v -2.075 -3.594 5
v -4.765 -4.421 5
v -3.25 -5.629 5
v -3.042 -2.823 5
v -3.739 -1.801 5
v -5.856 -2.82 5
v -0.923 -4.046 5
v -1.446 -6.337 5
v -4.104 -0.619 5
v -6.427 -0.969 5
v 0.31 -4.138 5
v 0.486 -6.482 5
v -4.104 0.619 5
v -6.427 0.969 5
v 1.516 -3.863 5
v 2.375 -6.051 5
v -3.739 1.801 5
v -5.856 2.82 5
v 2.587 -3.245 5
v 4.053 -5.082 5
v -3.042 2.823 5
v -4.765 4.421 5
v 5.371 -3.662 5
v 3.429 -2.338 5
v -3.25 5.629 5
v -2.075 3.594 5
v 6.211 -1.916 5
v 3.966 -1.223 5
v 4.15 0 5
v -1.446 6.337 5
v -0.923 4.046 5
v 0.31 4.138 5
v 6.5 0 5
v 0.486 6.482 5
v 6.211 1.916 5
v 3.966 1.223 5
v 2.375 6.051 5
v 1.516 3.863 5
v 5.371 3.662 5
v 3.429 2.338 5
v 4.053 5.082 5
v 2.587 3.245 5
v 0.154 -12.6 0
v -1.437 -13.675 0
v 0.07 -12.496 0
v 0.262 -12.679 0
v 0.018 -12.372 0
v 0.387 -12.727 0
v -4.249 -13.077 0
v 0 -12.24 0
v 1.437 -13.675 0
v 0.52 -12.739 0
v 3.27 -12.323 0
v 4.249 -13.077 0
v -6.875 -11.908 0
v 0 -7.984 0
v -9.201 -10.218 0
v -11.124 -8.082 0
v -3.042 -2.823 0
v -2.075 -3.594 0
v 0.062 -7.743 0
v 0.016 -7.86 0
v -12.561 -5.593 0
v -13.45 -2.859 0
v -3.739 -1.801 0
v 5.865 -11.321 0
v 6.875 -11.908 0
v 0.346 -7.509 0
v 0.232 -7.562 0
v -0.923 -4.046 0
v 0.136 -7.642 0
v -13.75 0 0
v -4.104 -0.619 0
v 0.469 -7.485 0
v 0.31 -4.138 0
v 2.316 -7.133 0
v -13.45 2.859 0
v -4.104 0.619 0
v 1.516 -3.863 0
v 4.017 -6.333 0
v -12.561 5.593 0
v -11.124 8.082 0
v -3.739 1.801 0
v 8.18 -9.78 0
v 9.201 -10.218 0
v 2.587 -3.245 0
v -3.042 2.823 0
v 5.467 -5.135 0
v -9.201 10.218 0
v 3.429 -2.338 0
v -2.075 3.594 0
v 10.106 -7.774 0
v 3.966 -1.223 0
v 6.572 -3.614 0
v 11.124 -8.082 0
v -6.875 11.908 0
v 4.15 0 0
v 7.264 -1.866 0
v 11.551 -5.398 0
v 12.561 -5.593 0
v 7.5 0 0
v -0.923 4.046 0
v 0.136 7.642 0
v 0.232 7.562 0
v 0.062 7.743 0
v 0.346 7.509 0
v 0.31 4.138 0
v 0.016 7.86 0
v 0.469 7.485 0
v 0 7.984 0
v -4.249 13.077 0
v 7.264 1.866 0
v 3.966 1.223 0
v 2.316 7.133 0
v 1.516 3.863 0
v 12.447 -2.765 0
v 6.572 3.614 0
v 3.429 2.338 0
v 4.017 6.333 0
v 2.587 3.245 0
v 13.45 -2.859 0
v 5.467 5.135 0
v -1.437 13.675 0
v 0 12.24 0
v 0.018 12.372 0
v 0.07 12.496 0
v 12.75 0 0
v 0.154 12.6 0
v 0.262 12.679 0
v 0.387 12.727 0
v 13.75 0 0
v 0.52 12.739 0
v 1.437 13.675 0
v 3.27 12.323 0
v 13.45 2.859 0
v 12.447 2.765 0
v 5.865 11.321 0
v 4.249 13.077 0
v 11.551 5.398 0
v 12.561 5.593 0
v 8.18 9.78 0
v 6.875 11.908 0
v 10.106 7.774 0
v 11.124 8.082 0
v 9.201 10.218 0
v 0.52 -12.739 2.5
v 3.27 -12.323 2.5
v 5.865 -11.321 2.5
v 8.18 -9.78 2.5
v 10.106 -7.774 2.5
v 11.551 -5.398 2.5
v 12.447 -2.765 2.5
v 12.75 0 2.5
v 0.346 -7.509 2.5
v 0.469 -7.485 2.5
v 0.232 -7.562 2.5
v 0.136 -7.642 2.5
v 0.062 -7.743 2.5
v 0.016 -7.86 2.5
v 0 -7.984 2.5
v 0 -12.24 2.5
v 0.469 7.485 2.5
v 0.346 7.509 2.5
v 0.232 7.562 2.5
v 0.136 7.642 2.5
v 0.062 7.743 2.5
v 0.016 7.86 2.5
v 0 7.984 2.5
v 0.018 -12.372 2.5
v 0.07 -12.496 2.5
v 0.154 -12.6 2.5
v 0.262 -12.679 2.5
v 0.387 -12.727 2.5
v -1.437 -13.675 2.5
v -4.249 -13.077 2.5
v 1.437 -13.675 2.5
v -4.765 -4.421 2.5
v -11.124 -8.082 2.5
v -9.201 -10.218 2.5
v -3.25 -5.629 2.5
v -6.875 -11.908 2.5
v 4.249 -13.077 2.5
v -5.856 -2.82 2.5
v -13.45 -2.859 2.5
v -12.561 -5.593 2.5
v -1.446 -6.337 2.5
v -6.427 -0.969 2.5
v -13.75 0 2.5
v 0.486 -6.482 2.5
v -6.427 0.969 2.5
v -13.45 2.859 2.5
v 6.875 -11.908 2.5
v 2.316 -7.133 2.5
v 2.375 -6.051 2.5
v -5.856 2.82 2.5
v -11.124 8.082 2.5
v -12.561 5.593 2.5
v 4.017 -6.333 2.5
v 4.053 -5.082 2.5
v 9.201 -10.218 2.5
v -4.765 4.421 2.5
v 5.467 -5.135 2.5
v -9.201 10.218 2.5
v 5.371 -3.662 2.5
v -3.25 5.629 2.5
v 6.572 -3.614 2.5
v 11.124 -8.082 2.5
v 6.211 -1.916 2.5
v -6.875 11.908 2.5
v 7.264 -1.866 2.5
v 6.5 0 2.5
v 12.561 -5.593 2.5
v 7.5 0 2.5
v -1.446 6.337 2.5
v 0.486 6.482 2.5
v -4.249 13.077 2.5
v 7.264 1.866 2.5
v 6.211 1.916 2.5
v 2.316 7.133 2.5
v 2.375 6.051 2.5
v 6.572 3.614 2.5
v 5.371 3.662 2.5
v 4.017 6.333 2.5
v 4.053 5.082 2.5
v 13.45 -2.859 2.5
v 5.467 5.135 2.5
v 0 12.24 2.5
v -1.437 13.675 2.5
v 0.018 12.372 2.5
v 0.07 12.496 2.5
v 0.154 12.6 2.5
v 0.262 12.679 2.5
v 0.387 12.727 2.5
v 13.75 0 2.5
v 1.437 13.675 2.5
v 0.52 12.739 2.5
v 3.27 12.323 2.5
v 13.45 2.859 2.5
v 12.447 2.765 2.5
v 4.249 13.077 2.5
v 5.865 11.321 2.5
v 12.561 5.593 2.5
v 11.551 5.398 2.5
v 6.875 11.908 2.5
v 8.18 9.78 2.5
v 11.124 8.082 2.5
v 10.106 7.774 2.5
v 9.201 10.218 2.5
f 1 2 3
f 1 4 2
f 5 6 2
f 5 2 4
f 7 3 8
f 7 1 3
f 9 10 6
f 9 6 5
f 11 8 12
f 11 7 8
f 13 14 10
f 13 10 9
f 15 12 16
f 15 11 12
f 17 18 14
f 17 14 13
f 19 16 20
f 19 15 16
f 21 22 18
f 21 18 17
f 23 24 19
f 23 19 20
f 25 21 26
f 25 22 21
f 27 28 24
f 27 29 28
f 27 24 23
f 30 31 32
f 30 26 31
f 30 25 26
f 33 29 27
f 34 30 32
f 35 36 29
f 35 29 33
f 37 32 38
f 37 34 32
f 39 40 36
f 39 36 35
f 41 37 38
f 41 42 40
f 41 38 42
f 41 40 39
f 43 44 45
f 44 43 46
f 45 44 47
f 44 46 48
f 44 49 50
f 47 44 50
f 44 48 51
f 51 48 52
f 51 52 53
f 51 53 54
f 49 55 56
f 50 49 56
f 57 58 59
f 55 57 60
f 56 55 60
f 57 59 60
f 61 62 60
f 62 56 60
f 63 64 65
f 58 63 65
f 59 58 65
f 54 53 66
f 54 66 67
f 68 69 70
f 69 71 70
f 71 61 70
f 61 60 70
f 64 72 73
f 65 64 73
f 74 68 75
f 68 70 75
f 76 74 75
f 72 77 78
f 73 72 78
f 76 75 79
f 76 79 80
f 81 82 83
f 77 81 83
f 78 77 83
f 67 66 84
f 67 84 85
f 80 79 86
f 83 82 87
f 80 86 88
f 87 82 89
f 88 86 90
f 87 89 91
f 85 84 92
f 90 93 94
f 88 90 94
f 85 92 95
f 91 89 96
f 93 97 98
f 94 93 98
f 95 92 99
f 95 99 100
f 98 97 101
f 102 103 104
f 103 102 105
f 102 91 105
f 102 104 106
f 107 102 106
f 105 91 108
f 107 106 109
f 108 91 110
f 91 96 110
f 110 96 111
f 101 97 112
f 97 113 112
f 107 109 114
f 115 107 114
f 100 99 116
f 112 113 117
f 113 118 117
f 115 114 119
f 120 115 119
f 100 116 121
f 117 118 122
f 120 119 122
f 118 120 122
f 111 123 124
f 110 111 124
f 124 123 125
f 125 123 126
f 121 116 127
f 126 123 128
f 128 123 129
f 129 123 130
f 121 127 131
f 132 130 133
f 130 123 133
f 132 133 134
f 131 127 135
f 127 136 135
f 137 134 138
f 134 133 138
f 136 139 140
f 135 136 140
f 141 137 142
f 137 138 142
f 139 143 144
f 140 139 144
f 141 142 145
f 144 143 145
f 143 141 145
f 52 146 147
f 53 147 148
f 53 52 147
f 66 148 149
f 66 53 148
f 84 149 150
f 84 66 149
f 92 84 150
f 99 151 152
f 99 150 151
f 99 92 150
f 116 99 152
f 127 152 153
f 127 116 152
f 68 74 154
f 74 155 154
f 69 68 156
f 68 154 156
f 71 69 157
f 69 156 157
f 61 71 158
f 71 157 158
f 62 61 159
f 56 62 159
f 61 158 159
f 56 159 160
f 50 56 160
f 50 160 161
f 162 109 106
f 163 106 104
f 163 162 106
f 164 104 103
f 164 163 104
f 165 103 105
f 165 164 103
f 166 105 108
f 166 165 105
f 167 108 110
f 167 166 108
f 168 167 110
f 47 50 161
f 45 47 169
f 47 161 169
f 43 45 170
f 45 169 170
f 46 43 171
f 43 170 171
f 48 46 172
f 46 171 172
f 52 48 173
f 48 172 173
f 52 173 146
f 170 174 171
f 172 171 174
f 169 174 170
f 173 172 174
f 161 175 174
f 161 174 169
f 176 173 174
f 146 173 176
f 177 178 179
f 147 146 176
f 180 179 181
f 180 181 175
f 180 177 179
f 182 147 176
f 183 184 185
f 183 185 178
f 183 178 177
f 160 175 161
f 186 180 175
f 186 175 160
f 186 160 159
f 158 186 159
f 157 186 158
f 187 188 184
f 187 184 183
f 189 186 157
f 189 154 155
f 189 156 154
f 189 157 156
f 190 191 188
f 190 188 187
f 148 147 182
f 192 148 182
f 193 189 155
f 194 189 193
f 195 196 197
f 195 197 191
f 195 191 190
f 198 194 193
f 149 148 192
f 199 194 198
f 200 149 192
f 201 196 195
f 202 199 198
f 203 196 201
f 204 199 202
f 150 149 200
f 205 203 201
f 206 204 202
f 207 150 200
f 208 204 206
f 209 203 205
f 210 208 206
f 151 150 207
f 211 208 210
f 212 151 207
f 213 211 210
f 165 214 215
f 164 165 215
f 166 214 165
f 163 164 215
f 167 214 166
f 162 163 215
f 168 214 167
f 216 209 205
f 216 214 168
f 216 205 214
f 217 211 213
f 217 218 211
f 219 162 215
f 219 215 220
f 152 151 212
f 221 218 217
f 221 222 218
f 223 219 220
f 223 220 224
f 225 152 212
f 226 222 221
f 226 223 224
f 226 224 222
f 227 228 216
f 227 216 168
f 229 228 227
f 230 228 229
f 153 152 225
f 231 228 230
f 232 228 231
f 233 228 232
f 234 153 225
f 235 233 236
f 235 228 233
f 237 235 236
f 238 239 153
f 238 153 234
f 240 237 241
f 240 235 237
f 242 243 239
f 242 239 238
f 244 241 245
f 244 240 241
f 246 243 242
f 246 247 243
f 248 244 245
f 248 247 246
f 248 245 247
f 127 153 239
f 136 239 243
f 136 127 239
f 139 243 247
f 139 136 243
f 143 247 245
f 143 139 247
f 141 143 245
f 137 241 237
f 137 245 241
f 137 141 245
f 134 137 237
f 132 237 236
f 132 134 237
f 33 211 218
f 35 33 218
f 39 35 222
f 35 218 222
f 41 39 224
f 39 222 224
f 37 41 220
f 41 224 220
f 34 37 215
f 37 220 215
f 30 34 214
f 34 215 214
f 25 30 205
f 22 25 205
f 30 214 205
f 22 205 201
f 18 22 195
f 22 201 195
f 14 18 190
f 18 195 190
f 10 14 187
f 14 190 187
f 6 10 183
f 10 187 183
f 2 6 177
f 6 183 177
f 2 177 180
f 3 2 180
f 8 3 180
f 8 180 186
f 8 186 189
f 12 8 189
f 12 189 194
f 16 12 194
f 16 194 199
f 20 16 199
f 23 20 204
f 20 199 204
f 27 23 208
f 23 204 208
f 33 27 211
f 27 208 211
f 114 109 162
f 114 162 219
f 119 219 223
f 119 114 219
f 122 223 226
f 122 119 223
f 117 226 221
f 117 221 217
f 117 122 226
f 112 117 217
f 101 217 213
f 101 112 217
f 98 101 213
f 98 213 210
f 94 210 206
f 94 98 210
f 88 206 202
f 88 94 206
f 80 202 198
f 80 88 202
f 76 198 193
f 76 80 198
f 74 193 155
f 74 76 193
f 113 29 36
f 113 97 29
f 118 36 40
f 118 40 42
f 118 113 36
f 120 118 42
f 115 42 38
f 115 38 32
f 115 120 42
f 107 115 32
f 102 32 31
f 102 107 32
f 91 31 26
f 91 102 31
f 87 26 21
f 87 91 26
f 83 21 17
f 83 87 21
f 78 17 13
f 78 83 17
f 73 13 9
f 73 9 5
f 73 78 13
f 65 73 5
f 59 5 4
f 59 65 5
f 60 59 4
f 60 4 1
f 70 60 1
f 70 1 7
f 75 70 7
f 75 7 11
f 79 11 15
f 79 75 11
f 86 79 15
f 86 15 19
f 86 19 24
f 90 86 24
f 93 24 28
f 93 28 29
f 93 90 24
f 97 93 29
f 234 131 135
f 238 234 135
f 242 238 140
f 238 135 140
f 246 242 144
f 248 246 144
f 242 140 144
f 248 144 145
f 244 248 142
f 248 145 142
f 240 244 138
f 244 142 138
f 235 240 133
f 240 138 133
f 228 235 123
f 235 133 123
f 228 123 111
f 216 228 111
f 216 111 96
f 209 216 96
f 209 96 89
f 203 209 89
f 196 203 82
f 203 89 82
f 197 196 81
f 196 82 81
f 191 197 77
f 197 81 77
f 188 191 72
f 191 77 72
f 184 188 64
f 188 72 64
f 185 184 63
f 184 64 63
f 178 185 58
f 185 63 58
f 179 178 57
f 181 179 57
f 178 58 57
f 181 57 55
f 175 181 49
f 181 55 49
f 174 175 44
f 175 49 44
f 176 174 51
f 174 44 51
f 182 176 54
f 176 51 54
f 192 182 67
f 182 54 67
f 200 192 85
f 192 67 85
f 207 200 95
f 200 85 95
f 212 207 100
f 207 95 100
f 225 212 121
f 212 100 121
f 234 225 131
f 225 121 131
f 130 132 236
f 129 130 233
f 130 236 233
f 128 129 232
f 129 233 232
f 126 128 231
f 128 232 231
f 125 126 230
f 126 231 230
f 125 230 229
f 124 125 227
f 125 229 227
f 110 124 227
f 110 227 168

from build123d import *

# Parameters (mm, degrees)
SKETCH1_R           = 13.75
SKETCH1_R_2         = 4.15
BOSS_EXTRUDE1_DEPTH = 2.5
SKETCH2_R           = 6.5
SKETCH2_R_2         = 4.15
BOSS_EXTRUDE2_DEPTH = 2.5
CUT_EXTRUDE1_DEPTH  = 21.077973005
FILLET1_R           = 0.5


with BuildPart() as part:
    # Sketch1 → Boss-Extrude1 (new body)
    with BuildSketch(Plane.XY):
        Circle(SKETCH1_R)
        Circle(SKETCH1_R_2, mode=Mode.SUBTRACT)
    extrude(amount=BOSS_EXTRUDE1_DEPTH)

    # Sketch2 → Boss-Extrude2 (add)
    with BuildSketch(Plane.XY.offset(2.5)):
        Circle(SKETCH2_R)
        Circle(SKETCH2_R_2, mode=Mode.SUBTRACT)
    extrude(amount=BOSS_EXTRUDE2_DEPTH)

    # Sketch5 → Cut-Extrude1 (cut, through all)
    with BuildSketch(Plane.XY):
        with BuildLine():
            Line((0, 12.75), (0, 7.5))
            ThreePointArc((0, 7.5), (5.303300859, 5.303300859), (7.5, 0))
            ThreePointArc((7.5, 0), (5.303300859, -5.303300859), (0, -7.5))
            Line((0, -7.5), (0, -12.75))
            ThreePointArc((0, -12.75), (9.01561146, -9.01561146), (12.75, 0))
            ThreePointArc((12.75, 0), (9.01561146, 9.01561146), (0, 12.75))
        make_face()
    extrude(amount=CUT_EXTRUDE1_DEPTH, mode=Mode.SUBTRACT)

    # Fillet1
    fillet1_edges = [part.edges().sort_by_distance(p)[0] for p in [
        (0, 7.5, 1.25),
        (0, -7.5, 1.25),
        (0, -12.75, 1.25),
        (0, 12.75, 1.25),
    ]]
    fillet(fillet1_edges, radius=FILLET1_R)


solid = part.part
